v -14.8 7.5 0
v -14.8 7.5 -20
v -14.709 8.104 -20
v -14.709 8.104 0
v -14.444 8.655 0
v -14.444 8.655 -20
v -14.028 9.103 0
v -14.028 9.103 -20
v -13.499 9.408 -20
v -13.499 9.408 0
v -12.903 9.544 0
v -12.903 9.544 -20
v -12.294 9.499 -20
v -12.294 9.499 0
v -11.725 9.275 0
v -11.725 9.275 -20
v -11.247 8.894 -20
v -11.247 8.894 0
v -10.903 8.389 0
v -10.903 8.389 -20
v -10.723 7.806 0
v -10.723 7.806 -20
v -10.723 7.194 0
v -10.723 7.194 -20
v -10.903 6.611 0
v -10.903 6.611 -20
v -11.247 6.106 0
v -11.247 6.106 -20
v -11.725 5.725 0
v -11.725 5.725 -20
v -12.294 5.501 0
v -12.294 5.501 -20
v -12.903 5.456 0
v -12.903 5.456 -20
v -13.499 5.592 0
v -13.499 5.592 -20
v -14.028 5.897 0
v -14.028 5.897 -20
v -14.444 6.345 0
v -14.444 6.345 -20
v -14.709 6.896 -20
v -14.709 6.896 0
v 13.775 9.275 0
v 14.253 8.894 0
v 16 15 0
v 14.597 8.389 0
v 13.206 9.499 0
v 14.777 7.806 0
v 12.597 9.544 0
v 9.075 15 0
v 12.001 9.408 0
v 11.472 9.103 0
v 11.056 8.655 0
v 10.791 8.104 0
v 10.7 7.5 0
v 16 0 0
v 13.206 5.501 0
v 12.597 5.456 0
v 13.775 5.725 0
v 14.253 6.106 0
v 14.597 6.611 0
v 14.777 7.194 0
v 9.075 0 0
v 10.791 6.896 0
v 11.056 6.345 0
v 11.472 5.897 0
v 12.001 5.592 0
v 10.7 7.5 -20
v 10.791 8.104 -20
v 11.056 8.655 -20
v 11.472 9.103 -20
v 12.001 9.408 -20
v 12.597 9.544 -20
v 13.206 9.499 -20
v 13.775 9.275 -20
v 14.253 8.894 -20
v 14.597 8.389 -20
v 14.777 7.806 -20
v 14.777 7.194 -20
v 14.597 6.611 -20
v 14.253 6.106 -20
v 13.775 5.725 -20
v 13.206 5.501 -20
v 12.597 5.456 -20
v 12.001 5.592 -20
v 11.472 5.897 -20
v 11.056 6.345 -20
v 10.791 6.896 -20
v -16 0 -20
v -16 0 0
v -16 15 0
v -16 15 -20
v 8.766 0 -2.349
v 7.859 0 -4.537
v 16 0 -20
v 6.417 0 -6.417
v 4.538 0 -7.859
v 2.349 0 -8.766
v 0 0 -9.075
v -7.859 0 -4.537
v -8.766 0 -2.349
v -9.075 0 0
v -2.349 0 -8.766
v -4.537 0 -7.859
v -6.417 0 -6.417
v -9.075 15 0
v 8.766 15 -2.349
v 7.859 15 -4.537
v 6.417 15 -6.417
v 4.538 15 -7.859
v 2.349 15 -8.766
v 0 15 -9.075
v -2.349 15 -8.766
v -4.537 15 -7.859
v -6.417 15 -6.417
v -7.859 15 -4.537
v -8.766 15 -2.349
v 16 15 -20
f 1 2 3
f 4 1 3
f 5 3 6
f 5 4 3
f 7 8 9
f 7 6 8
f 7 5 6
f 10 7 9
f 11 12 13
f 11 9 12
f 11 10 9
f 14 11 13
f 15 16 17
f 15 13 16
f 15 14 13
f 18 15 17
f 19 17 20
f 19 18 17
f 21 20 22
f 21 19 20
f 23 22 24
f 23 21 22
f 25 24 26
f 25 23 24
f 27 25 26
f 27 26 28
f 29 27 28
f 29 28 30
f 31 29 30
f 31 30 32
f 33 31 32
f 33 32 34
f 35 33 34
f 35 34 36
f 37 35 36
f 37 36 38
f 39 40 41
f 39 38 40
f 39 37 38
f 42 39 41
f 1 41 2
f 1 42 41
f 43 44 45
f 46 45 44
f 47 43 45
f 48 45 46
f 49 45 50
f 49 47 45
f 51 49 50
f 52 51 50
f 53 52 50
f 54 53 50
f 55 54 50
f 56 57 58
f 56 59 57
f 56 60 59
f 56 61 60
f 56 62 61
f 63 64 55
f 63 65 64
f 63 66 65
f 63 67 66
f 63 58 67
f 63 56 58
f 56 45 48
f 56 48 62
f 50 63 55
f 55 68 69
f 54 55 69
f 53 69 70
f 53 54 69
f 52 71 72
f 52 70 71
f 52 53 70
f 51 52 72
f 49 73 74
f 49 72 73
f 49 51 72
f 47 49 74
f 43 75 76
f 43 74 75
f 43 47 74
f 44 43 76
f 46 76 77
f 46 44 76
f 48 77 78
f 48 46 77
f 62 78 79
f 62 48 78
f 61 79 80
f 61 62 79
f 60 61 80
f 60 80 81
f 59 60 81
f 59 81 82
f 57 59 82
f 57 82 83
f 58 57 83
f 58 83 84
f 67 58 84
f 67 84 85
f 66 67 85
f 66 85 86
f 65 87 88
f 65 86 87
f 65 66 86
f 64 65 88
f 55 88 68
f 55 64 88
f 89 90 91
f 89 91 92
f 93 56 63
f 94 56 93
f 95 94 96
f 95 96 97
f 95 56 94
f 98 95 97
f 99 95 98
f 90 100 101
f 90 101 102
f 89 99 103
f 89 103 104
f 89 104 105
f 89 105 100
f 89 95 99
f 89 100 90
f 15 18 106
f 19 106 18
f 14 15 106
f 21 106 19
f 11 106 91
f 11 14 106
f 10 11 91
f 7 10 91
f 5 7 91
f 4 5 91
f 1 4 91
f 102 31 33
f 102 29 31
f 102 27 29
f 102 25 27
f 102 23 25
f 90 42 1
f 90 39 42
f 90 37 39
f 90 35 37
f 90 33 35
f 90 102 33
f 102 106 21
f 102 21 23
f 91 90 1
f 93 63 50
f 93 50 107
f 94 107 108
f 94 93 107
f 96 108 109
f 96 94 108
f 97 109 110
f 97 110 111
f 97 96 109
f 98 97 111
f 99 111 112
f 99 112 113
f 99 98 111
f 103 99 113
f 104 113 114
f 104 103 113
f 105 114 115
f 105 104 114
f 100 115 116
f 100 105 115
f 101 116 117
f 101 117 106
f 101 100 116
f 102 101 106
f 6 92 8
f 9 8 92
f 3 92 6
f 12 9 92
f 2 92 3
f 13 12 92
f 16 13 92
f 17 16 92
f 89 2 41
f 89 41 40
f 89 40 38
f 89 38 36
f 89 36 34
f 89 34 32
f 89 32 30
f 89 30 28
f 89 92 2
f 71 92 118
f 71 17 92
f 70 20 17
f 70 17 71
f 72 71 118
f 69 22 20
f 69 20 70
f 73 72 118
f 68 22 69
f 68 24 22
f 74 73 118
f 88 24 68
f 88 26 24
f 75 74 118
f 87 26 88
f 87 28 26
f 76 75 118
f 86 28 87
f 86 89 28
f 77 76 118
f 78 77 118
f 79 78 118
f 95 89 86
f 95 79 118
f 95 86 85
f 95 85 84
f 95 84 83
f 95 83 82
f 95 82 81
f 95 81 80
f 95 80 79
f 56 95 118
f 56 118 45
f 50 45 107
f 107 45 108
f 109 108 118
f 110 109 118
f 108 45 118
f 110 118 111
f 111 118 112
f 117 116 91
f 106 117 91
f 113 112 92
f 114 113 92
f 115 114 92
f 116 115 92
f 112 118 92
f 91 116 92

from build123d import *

# Parameters (mm, degrees)
BOSS_EXTRUDE1_DEPTH     = 15
CUT_EXTRUDE1_DEPTH      = 30.681644159
CUT_EXTRUDE1_DEPTH_BACK = 30.681644159
SKETCH3_R               = 2.05


with BuildPart() as part:
    # Sketch2 → Boss-Extrude1 (new body)
    with BuildSketch(Plane(origin=(0, 0, 0), x_dir=(1, 0, 0), z_dir=(0, 1, 0))):
        with BuildLine():
            Line((-16, 20), (16, 20))
            Line((16, 20), (16, 0))
            Line((16, 0), (9.075, 0))
            ThreePointArc((9.075, 0), (0, 9.075), (-9.075, 0))
            Line((-9.075, 0), (-16, 0))
            Line((-16, 0), (-16, 20))
        make_face()
    extrude(amount=BOSS_EXTRUDE1_DEPTH)

    # Sketch3 → Cut-Extrude1 (cut, two sides: drawn at the far end of the back side and taken through both)
    with BuildSketch(Plane(origin=(0, 0, -20), x_dir=(-1, 0, 0), z_dir=(0, 0, -1)).offset(-CUT_EXTRUDE1_DEPTH_BACK)):
        with Locations((-12.75, 7.5)):
            Circle(SKETCH3_R)
        with Locations((12.75, 7.5)):
            Circle(SKETCH3_R)
    extrude(amount=CUT_EXTRUDE1_DEPTH + CUT_EXTRUDE1_DEPTH_BACK, mode=Mode.SUBTRACT)


solid = part.part
